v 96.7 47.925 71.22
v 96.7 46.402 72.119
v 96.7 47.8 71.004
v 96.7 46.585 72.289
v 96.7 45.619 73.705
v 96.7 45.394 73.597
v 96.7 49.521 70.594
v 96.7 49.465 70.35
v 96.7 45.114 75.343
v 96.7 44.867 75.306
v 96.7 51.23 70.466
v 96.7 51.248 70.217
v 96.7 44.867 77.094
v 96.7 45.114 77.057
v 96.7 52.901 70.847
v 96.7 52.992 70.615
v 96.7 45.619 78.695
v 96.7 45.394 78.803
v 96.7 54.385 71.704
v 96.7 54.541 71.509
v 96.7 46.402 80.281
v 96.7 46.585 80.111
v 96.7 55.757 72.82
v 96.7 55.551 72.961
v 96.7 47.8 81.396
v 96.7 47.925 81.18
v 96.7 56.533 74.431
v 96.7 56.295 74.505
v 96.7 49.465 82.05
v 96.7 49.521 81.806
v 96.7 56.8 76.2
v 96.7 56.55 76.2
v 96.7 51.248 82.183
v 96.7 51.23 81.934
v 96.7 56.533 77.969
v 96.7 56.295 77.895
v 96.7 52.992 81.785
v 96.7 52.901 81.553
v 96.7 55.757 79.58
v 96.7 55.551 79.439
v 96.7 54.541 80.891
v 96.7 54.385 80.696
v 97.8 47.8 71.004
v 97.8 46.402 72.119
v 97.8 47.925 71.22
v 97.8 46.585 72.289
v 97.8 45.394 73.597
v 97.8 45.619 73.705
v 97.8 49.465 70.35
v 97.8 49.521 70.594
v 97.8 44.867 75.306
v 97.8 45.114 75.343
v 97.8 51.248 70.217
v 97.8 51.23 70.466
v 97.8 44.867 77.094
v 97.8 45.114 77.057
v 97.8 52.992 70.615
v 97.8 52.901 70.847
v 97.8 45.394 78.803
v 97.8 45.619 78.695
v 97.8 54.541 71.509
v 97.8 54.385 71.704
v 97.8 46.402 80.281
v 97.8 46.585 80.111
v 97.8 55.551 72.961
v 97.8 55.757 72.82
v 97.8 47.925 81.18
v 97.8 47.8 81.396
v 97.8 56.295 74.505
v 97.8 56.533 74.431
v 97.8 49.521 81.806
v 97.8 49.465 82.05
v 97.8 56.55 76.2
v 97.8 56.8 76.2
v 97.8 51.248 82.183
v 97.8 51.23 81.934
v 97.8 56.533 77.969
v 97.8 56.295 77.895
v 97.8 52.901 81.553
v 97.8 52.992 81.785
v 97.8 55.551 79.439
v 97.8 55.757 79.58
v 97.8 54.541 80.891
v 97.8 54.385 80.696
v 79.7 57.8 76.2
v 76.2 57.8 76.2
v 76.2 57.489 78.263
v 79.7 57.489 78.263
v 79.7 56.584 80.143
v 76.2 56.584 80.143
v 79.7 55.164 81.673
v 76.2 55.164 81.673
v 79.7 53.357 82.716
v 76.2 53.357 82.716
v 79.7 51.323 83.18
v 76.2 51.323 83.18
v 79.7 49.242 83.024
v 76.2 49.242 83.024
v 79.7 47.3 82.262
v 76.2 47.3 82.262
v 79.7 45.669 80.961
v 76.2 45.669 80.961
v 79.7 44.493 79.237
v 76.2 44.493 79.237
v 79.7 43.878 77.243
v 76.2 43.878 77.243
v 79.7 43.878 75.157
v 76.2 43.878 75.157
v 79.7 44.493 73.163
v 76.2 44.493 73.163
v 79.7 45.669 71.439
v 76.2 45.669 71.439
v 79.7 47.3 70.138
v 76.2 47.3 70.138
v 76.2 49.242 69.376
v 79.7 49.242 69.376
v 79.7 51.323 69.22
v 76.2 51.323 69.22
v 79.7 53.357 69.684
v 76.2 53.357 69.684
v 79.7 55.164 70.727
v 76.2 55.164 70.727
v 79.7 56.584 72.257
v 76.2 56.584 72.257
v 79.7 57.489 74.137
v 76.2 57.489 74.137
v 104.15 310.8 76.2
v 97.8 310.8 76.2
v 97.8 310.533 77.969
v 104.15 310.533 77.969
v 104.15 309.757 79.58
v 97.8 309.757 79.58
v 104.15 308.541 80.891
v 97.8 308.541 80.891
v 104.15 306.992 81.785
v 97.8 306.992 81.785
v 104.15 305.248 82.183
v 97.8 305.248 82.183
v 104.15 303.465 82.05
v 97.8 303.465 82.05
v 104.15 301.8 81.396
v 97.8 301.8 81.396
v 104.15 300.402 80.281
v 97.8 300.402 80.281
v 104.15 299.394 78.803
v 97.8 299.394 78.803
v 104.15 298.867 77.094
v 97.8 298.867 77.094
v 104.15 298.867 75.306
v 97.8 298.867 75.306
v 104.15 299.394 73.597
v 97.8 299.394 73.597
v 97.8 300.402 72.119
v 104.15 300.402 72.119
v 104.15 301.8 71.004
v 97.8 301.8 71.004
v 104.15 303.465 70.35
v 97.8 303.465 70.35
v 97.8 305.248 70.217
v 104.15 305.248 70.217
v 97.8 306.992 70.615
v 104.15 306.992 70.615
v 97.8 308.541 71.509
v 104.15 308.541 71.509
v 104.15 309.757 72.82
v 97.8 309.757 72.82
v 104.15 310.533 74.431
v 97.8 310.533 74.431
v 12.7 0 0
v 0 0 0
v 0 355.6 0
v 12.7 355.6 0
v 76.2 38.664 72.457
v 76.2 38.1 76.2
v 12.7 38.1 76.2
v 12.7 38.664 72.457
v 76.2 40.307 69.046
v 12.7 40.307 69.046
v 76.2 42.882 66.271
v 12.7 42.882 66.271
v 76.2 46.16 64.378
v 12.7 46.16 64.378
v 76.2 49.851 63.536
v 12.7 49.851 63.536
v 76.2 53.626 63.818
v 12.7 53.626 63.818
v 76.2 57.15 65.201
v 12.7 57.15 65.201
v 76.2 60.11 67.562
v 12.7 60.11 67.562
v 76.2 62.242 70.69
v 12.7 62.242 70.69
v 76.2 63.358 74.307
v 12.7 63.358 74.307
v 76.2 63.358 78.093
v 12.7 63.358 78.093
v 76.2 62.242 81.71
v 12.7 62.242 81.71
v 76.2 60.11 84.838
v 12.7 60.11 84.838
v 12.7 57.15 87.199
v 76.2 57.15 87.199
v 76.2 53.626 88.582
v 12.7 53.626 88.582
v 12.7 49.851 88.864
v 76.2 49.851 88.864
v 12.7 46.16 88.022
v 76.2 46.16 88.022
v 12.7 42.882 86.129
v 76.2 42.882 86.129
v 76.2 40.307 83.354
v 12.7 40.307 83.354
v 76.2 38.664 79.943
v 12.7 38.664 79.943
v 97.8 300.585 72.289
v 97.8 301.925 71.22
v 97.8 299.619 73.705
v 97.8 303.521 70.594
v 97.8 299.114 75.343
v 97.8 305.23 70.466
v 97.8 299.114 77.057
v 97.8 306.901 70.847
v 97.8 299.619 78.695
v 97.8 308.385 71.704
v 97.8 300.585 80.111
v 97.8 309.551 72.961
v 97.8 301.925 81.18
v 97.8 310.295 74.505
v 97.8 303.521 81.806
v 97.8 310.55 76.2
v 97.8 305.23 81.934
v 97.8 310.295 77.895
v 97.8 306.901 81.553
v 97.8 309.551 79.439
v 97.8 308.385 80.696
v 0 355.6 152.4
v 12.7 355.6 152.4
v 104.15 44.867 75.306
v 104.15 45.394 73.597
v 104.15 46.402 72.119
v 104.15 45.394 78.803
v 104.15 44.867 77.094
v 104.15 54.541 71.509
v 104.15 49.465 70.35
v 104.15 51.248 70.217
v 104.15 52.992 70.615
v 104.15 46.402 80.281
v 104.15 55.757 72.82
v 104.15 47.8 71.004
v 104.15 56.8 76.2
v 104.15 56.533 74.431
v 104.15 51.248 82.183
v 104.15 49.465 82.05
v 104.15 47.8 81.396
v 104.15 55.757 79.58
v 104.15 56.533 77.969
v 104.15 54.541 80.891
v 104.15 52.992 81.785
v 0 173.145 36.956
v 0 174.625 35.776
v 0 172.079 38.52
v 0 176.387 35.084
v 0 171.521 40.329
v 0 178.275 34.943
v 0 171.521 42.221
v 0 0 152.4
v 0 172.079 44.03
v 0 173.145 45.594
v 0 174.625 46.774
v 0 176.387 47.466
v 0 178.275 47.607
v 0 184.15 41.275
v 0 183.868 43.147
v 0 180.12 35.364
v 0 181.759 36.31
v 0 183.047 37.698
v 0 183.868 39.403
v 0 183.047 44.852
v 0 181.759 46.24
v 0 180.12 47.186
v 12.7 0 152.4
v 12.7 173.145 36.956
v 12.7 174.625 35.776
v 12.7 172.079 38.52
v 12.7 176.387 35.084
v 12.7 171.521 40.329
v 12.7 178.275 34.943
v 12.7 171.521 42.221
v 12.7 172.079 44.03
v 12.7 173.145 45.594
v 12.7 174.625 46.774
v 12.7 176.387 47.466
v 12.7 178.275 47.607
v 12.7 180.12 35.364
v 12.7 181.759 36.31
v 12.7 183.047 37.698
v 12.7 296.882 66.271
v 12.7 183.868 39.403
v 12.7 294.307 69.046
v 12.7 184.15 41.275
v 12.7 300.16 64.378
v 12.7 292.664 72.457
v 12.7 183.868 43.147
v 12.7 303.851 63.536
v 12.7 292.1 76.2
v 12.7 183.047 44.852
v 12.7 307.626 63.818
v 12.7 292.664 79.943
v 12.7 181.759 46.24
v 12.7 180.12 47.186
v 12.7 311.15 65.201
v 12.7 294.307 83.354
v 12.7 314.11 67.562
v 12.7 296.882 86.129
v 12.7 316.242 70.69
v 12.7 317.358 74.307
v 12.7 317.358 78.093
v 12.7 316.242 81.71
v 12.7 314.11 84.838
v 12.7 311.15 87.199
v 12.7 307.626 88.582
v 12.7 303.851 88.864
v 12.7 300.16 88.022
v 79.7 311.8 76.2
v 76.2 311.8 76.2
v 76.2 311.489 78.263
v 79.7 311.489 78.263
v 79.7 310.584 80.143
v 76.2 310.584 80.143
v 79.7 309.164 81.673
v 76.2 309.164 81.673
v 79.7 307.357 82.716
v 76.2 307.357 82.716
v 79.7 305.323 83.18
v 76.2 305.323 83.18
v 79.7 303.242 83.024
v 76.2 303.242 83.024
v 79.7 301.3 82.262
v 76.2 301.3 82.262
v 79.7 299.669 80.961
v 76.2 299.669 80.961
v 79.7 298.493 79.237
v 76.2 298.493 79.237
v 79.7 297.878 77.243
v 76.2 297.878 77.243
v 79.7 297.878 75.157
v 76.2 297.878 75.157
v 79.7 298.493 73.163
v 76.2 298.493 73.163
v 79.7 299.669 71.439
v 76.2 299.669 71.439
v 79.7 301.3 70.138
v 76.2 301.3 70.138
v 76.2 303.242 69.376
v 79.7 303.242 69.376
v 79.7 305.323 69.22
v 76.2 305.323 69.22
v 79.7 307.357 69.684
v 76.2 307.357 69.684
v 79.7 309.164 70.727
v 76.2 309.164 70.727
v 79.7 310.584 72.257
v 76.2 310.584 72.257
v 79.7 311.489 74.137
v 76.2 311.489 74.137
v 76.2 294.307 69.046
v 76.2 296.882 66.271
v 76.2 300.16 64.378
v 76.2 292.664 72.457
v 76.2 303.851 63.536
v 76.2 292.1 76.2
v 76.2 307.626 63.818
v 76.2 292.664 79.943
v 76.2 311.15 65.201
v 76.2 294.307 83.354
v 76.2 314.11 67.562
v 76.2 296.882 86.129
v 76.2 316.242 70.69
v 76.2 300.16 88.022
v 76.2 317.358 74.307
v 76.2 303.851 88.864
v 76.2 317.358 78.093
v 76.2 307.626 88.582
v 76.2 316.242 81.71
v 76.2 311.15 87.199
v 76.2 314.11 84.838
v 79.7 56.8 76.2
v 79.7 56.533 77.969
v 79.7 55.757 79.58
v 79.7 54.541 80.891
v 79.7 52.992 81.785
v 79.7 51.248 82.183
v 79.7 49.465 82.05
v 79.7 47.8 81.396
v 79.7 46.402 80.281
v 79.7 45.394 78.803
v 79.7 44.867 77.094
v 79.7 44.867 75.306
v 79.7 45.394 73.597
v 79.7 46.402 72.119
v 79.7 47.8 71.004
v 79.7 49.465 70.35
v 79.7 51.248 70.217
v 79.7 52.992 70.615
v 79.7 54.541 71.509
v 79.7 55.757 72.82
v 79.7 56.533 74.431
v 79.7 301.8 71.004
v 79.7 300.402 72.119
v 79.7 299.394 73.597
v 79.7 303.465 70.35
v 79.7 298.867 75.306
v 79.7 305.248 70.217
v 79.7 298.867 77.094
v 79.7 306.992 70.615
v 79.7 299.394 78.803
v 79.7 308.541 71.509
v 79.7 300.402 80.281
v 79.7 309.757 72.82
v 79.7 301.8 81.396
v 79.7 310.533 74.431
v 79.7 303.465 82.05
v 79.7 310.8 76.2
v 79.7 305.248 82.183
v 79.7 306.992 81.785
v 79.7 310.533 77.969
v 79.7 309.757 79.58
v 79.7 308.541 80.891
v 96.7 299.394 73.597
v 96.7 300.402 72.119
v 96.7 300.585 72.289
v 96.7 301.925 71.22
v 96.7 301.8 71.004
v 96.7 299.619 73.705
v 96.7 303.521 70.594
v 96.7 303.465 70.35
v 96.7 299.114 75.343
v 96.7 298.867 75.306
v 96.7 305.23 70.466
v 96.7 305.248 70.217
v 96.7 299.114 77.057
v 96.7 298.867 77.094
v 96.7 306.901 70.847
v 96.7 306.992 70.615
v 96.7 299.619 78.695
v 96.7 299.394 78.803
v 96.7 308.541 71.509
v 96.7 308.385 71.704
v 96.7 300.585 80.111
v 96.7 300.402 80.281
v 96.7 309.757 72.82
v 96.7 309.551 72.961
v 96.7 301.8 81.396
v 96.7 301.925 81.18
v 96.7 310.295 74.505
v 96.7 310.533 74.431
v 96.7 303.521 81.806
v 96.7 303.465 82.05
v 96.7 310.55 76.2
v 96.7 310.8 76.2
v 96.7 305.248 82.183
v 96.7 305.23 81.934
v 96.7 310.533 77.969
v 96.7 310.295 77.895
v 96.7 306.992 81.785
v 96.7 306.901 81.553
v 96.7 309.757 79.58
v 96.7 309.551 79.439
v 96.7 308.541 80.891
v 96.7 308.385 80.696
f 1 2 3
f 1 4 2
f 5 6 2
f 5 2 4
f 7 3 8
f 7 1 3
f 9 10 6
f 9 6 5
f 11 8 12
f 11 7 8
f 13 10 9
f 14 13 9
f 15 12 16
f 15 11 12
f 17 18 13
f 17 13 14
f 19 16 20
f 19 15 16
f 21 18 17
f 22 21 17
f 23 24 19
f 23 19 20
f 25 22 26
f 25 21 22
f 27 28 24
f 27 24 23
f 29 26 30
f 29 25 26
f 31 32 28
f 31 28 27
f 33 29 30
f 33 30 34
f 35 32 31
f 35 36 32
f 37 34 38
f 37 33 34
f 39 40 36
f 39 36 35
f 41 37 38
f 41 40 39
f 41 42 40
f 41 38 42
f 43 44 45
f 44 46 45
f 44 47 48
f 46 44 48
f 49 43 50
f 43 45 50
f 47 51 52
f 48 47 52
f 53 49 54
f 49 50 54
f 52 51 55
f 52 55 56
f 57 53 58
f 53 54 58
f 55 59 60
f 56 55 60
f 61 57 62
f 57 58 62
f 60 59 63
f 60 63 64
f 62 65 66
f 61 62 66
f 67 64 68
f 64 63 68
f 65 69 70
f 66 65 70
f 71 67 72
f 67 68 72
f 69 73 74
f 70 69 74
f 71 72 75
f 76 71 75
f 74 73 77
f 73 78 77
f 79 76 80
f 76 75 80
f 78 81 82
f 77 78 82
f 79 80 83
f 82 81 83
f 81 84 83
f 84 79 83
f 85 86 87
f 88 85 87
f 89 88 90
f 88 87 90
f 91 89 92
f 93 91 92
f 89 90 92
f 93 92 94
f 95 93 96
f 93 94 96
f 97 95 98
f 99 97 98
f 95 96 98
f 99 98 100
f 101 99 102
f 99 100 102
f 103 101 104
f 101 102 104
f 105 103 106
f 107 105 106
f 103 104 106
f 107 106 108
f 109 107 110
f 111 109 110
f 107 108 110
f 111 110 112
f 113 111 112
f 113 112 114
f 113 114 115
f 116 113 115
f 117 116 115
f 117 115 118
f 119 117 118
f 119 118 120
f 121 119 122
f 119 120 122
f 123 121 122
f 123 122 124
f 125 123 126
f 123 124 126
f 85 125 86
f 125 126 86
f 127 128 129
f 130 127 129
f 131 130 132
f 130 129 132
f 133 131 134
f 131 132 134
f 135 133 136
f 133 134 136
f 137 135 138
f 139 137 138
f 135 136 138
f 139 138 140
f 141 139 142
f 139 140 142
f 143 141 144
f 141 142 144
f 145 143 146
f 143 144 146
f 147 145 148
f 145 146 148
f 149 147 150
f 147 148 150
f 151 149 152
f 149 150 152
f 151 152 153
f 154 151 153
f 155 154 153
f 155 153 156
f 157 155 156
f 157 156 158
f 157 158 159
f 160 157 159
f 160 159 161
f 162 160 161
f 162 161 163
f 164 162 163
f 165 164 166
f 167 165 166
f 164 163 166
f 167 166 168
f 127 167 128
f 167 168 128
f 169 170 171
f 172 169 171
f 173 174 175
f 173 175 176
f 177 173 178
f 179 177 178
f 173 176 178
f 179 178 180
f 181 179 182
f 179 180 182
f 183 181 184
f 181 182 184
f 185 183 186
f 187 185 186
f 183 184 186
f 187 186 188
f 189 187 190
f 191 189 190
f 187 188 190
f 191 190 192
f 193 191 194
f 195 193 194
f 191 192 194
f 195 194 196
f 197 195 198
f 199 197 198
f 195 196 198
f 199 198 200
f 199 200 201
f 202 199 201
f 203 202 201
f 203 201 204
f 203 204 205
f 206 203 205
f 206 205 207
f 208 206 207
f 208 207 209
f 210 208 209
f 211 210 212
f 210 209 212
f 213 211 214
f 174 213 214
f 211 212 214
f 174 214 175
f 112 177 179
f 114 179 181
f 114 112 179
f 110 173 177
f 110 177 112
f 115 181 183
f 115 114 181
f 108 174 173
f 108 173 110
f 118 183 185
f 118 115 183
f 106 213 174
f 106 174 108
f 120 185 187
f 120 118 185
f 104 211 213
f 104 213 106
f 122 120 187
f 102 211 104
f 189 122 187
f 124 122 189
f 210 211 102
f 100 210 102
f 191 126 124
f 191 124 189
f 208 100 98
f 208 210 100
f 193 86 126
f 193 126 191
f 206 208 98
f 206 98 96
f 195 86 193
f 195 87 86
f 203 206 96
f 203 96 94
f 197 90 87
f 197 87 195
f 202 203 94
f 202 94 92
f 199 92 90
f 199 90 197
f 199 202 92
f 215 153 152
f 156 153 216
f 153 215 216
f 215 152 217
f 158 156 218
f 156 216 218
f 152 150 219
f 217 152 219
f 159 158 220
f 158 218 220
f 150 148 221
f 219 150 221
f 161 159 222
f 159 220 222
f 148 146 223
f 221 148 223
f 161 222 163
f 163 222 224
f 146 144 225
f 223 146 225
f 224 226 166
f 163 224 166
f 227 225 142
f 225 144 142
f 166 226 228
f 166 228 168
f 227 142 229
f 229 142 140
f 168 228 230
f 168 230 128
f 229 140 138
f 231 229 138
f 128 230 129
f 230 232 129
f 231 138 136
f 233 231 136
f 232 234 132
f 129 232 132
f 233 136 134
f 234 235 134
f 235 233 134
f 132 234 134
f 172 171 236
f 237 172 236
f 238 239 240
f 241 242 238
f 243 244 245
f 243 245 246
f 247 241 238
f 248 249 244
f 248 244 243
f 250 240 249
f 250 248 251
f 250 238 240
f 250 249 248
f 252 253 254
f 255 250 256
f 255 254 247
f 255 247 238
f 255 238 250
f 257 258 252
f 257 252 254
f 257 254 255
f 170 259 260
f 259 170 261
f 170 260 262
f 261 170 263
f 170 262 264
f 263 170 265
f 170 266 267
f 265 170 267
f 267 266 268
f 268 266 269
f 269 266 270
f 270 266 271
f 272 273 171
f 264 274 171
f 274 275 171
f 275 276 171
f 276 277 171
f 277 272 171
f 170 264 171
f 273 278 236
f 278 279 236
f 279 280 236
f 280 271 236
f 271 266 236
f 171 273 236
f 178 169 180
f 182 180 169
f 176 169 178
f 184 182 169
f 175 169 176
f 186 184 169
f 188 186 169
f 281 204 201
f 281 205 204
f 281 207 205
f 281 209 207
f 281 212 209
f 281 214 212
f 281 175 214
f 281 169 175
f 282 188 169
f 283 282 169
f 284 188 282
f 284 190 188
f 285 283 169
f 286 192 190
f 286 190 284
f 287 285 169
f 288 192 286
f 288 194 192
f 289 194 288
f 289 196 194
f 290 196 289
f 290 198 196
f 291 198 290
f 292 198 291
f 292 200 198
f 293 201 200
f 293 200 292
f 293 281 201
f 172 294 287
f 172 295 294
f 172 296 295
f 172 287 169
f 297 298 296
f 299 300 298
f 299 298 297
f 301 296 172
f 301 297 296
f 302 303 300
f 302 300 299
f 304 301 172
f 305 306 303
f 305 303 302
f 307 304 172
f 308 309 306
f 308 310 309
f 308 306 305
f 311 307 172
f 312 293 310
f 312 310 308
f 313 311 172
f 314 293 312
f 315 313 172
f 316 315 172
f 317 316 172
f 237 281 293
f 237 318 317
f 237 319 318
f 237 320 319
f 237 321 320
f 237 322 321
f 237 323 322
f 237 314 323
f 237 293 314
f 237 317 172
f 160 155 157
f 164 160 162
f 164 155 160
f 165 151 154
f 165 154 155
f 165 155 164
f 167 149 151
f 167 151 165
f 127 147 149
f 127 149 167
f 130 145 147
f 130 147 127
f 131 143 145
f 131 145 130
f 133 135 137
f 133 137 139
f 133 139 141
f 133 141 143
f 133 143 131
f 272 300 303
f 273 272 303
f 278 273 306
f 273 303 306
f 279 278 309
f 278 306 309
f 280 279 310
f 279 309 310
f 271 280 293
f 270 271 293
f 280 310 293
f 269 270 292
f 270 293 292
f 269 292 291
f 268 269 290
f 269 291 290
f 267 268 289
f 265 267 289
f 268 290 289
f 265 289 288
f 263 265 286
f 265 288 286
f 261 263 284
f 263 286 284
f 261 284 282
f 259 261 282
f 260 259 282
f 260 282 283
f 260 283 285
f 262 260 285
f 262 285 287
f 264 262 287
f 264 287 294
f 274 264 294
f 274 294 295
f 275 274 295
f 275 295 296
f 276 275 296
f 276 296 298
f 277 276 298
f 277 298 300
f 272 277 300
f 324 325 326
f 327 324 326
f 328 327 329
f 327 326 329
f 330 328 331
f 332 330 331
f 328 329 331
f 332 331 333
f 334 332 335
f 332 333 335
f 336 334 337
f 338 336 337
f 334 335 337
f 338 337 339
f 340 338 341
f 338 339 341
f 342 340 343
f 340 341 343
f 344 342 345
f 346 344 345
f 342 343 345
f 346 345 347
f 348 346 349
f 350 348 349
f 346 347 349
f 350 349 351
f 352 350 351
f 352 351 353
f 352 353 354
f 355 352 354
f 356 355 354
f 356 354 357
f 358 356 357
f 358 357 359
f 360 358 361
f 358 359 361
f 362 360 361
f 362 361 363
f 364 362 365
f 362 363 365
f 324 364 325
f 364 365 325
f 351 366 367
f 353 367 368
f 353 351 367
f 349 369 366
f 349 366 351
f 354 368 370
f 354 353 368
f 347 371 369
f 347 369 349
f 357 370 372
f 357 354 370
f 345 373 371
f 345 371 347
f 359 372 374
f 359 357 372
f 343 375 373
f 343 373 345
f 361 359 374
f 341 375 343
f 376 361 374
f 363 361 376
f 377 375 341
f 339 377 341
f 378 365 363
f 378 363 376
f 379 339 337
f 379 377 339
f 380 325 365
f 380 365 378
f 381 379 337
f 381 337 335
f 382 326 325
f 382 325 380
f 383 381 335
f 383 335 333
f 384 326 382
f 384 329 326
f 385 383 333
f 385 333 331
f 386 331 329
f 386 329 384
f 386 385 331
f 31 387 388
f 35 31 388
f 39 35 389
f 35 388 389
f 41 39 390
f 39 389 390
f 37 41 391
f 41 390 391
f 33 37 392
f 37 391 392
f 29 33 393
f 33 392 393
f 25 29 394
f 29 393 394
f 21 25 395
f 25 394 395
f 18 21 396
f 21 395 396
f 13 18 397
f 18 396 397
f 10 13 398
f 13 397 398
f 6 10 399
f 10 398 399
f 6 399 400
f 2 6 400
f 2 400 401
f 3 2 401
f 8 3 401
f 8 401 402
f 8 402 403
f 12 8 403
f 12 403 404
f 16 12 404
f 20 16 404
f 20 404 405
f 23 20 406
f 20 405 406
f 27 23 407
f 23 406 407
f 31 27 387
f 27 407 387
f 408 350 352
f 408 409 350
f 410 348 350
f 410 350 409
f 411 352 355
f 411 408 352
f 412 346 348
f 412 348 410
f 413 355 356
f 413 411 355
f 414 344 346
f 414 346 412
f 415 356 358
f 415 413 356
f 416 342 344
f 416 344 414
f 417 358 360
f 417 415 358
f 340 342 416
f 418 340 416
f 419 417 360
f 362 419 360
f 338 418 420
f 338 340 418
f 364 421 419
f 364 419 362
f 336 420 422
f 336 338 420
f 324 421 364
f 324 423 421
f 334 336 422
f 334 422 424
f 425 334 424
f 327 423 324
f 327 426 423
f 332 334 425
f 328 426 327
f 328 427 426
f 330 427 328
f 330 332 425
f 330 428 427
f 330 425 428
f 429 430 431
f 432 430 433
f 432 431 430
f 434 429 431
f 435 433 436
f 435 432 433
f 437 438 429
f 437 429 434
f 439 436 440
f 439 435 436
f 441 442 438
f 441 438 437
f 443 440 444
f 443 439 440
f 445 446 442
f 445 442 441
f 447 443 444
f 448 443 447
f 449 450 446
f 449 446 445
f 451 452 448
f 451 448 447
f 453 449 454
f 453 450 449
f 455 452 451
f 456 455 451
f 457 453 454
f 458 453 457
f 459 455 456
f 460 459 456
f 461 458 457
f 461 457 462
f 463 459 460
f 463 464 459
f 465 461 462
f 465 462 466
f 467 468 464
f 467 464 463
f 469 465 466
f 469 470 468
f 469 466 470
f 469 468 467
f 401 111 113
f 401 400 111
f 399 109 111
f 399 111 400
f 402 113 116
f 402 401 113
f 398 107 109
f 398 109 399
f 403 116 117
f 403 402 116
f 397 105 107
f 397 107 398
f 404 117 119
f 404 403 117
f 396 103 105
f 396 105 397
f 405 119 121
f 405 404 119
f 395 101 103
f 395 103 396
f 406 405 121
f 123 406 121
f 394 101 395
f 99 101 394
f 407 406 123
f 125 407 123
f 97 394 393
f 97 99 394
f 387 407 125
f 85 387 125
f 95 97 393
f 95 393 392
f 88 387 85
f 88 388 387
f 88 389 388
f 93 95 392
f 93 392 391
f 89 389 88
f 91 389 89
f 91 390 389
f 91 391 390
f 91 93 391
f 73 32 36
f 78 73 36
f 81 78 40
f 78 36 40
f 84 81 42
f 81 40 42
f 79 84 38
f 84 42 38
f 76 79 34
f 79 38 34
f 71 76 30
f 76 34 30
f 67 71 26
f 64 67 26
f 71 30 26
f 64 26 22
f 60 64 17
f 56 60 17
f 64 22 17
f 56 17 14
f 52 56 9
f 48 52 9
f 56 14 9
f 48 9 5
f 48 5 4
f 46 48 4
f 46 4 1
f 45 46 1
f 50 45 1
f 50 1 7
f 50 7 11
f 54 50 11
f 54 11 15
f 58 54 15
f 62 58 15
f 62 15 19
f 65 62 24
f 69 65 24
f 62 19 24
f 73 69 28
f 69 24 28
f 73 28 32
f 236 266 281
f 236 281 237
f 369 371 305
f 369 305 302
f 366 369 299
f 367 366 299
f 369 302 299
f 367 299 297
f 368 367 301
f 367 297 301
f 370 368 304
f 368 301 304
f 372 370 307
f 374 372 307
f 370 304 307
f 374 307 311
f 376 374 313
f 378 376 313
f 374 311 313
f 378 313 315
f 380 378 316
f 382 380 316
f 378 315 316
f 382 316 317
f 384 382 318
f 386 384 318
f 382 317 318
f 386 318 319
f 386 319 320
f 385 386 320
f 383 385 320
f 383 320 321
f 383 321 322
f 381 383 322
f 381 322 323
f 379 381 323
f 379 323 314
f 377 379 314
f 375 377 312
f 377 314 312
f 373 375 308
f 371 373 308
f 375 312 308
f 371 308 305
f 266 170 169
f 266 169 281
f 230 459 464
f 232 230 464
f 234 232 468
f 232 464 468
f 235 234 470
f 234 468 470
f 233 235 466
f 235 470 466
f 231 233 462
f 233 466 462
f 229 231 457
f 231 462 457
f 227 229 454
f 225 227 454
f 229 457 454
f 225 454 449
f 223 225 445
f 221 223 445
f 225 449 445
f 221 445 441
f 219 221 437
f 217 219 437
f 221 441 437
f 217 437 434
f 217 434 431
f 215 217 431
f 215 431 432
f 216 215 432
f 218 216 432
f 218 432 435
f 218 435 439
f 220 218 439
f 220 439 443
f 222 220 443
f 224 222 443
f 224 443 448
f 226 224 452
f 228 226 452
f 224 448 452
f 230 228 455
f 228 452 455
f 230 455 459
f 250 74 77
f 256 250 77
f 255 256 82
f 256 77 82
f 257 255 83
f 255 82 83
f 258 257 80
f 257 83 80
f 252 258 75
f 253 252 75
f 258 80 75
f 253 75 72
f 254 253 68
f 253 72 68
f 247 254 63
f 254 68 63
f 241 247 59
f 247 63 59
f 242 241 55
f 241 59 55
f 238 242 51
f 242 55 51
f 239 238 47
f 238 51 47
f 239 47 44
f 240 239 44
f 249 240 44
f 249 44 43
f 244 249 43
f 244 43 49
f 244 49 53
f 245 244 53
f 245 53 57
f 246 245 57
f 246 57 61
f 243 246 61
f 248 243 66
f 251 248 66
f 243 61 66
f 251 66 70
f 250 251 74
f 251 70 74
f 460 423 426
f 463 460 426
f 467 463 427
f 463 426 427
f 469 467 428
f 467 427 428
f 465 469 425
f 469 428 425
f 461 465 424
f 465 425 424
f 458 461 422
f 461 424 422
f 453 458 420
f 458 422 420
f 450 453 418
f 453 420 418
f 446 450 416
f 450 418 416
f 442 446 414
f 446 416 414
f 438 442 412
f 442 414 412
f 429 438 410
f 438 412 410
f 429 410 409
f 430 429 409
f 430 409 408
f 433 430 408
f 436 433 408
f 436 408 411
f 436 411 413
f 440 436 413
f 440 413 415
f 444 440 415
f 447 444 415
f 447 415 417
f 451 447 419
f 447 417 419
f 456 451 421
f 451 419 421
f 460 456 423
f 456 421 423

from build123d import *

# Parameters (mm, degrees)
F0_W      = 355.6
F0_H      = 152.4
F1_DEPTH  = 12.7
F3_DEPTH  = 63.5
F4_R      = 6.9999987
F5_DEPTH  = 3.50012
F6_R      = 6.9999987
F7_DEPTH  = 3.50012
F8_R      = 6.0000007
F9_DEPTH  = 16.9999914
F10_R     = 6.0000007
F11_DEPTH = 16.9999914
F12_R     = 5.74999993
F13_DEPTH = 1.10000034
F14_R     = 5.74999993
F15_DEPTH = 1.10000034
F16_R     = 6.0000007
F17_DEPTH = 6.35
F18_R     = 6.0000007
F19_DEPTH = 6.35
F20_R     = 6.35
F21_DEPTH = 25.4


with BuildPart() as f1:
    # F0 (on Right) → F1 (new body)
    with BuildSketch(Plane.YZ):
        with Locations((177.8, 76.2)):
            Rectangle(F0_W, F0_H)
    extrude(amount=F1_DEPTH)

    # F2 (on face) → F3 (join)
    with BuildSketch(Plane.YZ.offset(12.7)):
        with BuildLine():
            ThreePointArc((63.5, 76.2), (50.8, 88.9), (38.1, 76.2))
            Line((38.1, 76.2), (63.5, 76.2))
        make_face()
        with BuildLine():
            ThreePointArc((317.5, 76.2), (304.8, 88.9), (292.1, 76.2))
            Line((292.1, 76.2), (317.5, 76.2))
        make_face()
        with BuildLine():
            Line((317.5, 76.2), (292.1, 76.2))
            ThreePointArc((292.1, 76.2), (304.8, 63.5), (317.5, 76.2))
        make_face()
        with BuildLine():
            Line((63.5, 76.2), (38.1, 76.2))
            ThreePointArc((38.1, 76.2), (50.8, 63.5), (63.5, 76.2))
        make_face()
    extrude(amount=F3_DEPTH)

    # F4 (on face) → F5 (join)
    with BuildSketch(Plane.YZ.offset(76.2)):
        with Locations((50.8, 76.2)):
            Circle(F4_R)
    extrude(amount=F5_DEPTH)

    # F6 (on face) → F7 (join)
    with BuildSketch(Plane.YZ.offset(76.2)):
        with Locations((304.8, 76.2)):
            Circle(F6_R)
    extrude(amount=F7_DEPTH)

    # F8 (on face) → F9 (join)
    with BuildSketch(Plane.YZ.offset(79.70012)):
        with Locations((50.8, 76.2)):
            Circle(F8_R)
    extrude(amount=F9_DEPTH)

    # F10 (on face) → F11 (join)
    with BuildSketch(Plane.YZ.offset(79.70012)):
        with Locations((304.8, 76.2)):
            Circle(F10_R)
    extrude(amount=F11_DEPTH)

    # F12 (on face) → F13 (join)
    with BuildSketch(Plane.YZ.offset(96.7001114)):
        with Locations((50.8, 76.2)):
            Circle(F12_R)
    extrude(amount=F13_DEPTH)

    # F14 (on face) → F15 (join)
    with BuildSketch(Plane.YZ.offset(96.7001114)):
        with Locations((304.8, 76.2)):
            Circle(F14_R)
    extrude(amount=F15_DEPTH)

    # F16 (on face) → F17 (join)
    with BuildSketch(Plane.YZ.offset(97.80011174)):
        with Locations((50.8, 76.2)):
            Circle(F16_R)
    extrude(amount=F17_DEPTH)

    # F18 (on face) → F19 (join)
    with BuildSketch(Plane.YZ.offset(97.80011174)):
        with Locations((304.8, 76.2)):
            Circle(F18_R)
    extrude(amount=F19_DEPTH)

    # F20 (on face) → F21 (cut)
    with BuildSketch(Plane.YZ.offset(12.7)):
        with Locations((177.8, 41.275)):
            Circle(F20_R)
    extrude(amount=-F21_DEPTH, mode=Mode.SUBTRACT)


solid = f1.part
